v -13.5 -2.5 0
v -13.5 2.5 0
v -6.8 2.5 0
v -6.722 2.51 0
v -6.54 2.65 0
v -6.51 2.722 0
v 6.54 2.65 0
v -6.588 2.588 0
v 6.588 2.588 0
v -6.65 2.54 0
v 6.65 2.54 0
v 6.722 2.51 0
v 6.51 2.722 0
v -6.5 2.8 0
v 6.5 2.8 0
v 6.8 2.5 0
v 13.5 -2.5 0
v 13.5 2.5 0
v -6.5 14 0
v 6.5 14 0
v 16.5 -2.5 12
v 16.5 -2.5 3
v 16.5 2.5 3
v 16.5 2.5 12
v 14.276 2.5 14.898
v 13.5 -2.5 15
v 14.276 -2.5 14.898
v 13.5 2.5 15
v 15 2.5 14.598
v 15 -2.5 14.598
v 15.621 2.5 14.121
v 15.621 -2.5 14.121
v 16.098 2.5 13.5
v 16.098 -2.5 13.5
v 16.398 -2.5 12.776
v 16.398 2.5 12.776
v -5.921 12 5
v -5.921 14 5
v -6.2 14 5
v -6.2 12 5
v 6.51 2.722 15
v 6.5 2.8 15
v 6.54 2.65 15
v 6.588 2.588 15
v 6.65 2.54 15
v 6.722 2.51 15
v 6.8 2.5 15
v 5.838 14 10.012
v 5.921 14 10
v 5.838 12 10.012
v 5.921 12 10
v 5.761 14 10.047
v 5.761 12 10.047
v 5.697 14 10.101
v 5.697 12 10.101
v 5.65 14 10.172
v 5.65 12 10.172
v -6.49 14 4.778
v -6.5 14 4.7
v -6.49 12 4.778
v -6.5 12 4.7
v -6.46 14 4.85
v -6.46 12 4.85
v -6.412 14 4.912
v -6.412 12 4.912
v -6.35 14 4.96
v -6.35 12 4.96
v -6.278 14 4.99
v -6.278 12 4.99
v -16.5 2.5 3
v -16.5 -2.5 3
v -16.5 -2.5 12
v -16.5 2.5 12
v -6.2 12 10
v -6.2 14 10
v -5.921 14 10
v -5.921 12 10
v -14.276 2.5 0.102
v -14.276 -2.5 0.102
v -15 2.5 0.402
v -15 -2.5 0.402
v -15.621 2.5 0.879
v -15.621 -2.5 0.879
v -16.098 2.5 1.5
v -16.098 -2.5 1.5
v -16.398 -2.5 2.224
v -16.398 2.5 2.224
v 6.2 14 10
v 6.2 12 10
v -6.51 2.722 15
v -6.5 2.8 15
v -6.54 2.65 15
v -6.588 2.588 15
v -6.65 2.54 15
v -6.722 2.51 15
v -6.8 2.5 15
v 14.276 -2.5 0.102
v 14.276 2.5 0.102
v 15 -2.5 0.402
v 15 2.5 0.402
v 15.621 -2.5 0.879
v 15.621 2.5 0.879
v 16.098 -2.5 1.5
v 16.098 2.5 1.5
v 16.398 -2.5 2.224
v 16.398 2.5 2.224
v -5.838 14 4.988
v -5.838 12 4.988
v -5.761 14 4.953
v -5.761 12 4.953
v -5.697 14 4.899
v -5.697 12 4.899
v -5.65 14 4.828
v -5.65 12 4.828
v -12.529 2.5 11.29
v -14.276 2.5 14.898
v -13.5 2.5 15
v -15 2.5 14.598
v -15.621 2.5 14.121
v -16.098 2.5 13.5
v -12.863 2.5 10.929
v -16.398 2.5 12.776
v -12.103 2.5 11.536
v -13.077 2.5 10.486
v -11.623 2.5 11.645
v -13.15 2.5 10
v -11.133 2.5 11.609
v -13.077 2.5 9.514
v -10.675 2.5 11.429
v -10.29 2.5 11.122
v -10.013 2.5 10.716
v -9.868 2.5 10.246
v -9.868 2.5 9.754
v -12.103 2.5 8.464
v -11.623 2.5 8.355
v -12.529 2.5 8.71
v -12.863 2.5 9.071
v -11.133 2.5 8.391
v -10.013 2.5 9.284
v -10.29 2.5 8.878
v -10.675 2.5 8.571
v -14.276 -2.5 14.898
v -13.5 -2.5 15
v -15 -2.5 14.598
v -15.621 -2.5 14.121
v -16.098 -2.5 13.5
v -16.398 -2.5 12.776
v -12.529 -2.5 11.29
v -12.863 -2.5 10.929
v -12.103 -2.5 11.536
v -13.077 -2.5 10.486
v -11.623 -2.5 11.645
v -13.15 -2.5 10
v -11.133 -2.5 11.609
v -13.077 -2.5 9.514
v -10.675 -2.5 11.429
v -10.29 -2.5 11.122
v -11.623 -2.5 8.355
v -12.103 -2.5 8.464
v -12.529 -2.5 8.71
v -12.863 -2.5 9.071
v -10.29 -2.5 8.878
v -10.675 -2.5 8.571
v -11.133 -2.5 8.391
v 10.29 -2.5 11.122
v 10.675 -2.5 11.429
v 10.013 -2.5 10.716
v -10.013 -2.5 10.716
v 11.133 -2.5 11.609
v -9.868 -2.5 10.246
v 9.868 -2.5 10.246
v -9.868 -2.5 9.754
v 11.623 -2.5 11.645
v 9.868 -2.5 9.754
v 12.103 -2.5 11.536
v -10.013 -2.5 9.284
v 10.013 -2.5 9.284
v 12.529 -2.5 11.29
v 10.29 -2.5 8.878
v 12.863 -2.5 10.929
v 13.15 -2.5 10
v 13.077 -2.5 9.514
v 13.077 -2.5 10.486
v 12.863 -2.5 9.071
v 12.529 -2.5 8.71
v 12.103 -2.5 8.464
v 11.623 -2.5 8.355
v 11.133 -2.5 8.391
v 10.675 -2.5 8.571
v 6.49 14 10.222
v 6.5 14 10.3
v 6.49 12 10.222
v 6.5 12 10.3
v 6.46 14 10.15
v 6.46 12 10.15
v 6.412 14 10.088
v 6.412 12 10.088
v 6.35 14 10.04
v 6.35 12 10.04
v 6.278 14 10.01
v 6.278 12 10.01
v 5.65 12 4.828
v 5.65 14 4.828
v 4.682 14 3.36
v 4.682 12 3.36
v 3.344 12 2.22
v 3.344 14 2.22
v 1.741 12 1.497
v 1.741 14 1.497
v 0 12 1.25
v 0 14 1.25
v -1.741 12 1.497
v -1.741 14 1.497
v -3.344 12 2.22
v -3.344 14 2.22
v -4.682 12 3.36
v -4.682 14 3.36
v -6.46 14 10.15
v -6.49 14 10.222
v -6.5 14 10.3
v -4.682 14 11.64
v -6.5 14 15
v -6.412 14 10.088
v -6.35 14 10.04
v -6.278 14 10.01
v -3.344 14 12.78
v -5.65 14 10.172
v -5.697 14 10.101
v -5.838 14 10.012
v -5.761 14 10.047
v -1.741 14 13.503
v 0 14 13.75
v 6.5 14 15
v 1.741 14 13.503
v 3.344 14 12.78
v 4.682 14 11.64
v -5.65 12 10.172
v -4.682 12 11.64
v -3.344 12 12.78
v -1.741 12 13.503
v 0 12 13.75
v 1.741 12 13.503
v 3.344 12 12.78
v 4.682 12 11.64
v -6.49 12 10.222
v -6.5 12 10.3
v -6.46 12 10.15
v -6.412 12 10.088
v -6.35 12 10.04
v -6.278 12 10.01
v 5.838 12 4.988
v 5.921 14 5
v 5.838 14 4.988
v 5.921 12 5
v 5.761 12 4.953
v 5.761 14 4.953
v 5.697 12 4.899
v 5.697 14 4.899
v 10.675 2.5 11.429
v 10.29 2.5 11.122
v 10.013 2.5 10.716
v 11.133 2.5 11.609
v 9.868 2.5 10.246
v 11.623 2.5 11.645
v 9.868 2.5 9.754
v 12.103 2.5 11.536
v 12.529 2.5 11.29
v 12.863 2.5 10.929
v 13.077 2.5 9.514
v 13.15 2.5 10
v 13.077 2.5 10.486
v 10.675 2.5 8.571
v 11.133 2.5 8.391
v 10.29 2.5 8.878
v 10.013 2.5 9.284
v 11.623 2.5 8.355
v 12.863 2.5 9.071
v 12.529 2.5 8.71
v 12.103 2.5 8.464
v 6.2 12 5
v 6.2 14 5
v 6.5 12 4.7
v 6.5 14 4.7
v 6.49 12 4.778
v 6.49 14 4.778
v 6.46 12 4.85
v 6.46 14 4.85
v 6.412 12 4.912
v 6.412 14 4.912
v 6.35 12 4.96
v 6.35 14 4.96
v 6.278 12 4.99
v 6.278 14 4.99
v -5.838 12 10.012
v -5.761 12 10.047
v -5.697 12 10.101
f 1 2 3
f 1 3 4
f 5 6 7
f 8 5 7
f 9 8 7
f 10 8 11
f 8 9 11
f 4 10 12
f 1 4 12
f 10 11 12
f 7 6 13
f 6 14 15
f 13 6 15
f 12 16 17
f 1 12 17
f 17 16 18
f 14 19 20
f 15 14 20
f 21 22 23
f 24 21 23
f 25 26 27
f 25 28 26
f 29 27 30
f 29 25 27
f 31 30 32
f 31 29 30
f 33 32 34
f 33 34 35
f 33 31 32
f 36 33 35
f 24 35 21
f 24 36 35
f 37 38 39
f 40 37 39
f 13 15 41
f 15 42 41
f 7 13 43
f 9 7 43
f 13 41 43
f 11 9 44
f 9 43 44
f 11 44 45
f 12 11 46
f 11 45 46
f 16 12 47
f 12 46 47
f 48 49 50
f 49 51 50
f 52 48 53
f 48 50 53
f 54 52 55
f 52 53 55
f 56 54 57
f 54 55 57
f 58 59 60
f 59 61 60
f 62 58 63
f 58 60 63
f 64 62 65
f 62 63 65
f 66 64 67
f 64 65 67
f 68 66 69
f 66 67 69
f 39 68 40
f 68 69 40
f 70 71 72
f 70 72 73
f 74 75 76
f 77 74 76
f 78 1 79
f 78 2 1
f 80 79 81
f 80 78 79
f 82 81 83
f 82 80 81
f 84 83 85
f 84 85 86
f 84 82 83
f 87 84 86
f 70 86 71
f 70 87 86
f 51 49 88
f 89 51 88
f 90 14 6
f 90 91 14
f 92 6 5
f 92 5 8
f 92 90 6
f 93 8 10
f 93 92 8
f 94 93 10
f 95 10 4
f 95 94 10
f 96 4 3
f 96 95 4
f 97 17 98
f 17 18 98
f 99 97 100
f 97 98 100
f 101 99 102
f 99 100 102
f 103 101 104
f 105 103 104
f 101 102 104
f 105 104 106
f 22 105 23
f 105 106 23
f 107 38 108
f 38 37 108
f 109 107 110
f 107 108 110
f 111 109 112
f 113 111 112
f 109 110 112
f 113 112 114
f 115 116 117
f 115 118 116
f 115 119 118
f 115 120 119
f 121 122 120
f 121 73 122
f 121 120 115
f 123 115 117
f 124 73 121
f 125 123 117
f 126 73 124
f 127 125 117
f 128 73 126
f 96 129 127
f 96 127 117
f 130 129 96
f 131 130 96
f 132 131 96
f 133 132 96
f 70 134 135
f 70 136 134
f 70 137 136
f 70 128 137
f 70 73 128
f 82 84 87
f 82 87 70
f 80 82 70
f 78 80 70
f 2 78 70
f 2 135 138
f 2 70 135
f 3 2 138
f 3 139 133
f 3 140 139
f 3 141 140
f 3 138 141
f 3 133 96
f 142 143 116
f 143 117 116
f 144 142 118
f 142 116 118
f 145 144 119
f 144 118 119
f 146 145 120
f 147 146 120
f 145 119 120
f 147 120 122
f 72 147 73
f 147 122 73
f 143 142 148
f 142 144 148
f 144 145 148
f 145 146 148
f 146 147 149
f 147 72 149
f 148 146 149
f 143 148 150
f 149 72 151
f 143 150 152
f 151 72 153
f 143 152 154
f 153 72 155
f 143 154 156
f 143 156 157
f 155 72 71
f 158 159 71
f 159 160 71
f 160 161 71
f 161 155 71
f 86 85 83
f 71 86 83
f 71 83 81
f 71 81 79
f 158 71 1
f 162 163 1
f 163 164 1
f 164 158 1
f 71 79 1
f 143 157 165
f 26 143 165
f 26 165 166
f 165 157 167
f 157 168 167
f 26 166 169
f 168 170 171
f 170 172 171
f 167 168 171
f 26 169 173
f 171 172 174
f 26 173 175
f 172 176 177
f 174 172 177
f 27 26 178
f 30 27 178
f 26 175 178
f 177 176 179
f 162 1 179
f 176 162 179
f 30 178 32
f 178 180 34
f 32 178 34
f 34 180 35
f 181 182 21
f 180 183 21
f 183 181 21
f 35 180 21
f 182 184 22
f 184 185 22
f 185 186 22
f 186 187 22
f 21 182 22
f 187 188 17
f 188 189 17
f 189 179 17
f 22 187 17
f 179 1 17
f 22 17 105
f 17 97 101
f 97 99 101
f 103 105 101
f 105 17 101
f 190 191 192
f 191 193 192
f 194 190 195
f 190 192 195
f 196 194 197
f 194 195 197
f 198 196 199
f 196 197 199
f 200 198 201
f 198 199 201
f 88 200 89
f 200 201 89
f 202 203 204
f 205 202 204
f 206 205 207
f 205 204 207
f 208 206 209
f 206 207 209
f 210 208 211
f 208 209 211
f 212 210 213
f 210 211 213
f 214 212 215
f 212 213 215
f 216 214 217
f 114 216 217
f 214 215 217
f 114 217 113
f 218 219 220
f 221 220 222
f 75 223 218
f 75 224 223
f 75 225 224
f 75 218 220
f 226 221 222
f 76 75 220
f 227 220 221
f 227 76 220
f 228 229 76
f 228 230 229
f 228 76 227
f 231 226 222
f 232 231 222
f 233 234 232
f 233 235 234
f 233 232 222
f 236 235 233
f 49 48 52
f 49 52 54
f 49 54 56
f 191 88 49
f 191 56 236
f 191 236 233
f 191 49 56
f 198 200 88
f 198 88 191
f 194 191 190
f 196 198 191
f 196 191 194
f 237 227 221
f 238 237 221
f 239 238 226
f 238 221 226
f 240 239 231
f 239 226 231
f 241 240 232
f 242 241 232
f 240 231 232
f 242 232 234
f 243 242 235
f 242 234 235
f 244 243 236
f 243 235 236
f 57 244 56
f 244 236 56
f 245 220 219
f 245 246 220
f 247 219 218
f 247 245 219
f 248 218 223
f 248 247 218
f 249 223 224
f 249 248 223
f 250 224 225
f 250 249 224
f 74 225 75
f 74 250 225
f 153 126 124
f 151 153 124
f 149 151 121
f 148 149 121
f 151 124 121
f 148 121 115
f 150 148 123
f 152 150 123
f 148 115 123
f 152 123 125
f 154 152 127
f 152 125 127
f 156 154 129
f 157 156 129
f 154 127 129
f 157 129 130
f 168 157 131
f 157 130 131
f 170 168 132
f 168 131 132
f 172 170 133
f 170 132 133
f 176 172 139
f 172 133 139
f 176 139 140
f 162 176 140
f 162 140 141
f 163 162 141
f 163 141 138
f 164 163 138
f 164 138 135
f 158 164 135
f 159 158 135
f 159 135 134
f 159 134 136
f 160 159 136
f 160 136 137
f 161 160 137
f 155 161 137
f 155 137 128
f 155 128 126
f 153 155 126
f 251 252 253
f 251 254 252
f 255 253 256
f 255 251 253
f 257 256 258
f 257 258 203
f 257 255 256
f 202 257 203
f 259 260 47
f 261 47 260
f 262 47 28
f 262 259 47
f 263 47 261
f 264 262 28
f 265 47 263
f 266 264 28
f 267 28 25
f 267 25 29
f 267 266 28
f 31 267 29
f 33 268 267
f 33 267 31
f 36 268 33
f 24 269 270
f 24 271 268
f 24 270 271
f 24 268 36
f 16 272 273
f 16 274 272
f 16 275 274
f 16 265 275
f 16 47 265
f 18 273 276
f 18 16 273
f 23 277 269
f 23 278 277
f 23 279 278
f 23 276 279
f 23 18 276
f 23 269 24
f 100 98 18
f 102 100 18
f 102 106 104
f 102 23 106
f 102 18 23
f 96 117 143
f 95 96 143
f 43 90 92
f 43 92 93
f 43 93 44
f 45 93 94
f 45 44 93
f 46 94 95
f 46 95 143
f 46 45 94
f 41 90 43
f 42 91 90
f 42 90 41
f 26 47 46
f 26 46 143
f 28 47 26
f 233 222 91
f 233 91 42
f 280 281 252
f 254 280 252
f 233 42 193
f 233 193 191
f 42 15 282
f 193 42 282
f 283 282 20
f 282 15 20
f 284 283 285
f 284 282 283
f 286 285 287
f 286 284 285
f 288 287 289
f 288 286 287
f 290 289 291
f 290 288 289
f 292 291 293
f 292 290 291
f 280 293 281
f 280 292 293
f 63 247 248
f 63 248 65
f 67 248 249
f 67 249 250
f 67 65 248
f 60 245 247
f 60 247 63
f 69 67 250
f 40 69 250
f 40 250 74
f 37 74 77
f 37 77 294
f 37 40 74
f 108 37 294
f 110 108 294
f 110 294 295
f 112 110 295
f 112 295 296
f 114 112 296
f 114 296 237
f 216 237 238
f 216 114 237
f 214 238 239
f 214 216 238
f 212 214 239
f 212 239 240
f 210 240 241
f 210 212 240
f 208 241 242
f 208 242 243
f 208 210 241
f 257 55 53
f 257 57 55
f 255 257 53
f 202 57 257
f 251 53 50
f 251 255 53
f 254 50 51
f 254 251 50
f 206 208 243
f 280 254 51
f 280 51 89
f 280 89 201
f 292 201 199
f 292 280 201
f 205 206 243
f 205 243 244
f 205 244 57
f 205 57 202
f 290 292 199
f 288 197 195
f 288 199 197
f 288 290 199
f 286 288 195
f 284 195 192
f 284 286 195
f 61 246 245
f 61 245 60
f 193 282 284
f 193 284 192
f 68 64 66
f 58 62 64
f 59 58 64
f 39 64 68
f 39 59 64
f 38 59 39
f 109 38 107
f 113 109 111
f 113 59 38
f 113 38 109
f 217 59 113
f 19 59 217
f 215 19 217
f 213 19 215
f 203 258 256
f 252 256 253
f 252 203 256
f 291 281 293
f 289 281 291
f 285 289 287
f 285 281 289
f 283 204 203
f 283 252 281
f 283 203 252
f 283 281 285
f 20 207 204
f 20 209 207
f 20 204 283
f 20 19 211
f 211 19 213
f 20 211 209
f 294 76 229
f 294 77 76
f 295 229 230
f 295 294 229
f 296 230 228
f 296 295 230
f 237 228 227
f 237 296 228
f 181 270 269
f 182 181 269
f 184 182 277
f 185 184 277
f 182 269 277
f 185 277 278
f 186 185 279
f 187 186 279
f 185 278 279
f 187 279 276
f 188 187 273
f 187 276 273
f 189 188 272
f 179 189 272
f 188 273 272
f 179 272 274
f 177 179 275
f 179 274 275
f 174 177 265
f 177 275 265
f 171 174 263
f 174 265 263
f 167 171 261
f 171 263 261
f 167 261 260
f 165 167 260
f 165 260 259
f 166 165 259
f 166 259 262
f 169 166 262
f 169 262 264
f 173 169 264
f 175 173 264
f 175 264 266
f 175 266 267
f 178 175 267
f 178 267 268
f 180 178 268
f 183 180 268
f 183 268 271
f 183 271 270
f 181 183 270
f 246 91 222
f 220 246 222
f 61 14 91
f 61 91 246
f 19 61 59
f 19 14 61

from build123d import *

# Parameters (mm, degrees)
SKETCH_1_W          = 33
SKETCH_1_H          = 5
SKETCH_1_W_2        = 13
SKETCH_1_H_2        = 11.5
EXTRUDE_1_DEPTH     = 15
SKETCH_2_R          = 1.65
CUT_EXTRUDE_1_DEPTH = 26.089838581
CUT_EXTRUDE_3_DEPTH = 2
FILLET_2_R          = 0.3
FILLET_3_R          = 0.3
FILLET_4_R          = 3


with BuildPart() as part:
    # ｽｹｯﾁ1 → ﾎﾞｽ - 押し出し1 (new body)
    with BuildSketch(Plane.XY):
        Rectangle(SKETCH_1_W, SKETCH_1_H)
        with Locations((0, 8.25)):
            Rectangle(SKETCH_1_W_2, SKETCH_1_H_2)
    extrude(amount=EXTRUDE_1_DEPTH)

    # ｽｹｯﾁ2 → ｶｯﾄ - 押し出し1 (cut, through all)
    with BuildSketch(Plane(origin=(0, 2.5, 0), x_dir=(1, 0, 0), z_dir=(0, 1, 0))):
        with Locations(Location((-11.5, -10, 0), (0, 0, 180))):
            Circle(SKETCH_2_R)
        with Locations((11.5, -10)):
            Circle(SKETCH_2_R)
    extrude(amount=-CUT_EXTRUDE_1_DEPTH, mode=Mode.SUBTRACT)

    # ｽｹｯﾁ3 → ｶｯﾄ - 押し出し3 (cut)
    with BuildSketch(Plane(origin=(0, 14, 0), x_dir=(1, 0, 0), z_dir=(0, 1, 0))):
        with BuildLine():
            Line((-5.728219619, -5), (5.728219619, -5))
            ThreePointArc((5.728219619, -5), (0, -1.25), (-5.728219619, -5))
        make_face()
        with BuildLine():
            ThreePointArc((-5.728219619, -10), (0, -13.75), (5.728219619, -10))
            Line((5.728219619, -10), (-5.728219619, -10))
        make_face()
        with BuildLine():
            ThreePointArc((6.25, -7.5), (6.118164456, -6.223064727), (5.728219619, -5))
            Line((5.728219619, -5), (-5.728219619, -5))
            ThreePointArc((-5.728219619, -5), (-6.25, -7.5), (-5.728219619, -10))
            Line((-5.728219619, -10), (5.728219619, -10))
            ThreePointArc((5.728219619, -10), (6.118164456, -8.776935273), (6.25, -7.5))
        make_face()
        with BuildLine():
            ThreePointArc((-5.728219619, -10), (-6.25, -7.5), (-5.728219619, -5))
            Line((-5.728219619, -5), (-6.5, -5))
            Line((-6.5, -5), (-6.5, -10))
            Line((-6.5, -10), (-5.728219619, -10))
        make_face()
        with BuildLine():
            Line((6.5, -10), (6.5, -5))
            Line((6.5, -5), (5.728219619, -5))
            ThreePointArc((5.728219619, -5), (6.118164456, -6.223064727), (6.25, -7.5))
            ThreePointArc((6.25, -7.5), (6.118164456, -8.776935273), (5.728219619, -10))
            Line((5.728219619, -10), (6.5, -10))
        make_face()
    extrude(amount=-CUT_EXTRUDE_3_DEPTH, mode=Mode.SUBTRACT)

    # ﾌｨﾚｯﾄ2
    fillet_2_edges = [part.edges().sort_by_distance(p)[0] for p in [
        (-5.728219619, 13, 5),
        (5.728219619, 13, 5),
        (6.5, 13, 5),
        (6.5, 13, 10),
        (5.728219619, 13, 10),
        (-5.728219619, 13, 10),
        (-6.5, 13, 10),
        (-6.5, 13, 5),
    ]]
    fillet(fillet_2_edges, radius=FILLET_2_R)

    # ﾌｨﾚｯﾄ3
    fillet_3_edges = [part.edges().sort_by_distance(p)[0] for p in [
        (-6.5, 2.5, 7.5),
        (6.5, 2.5, 7.5),
    ]]
    fillet(fillet_3_edges, radius=FILLET_3_R)

    # ﾌｨﾚｯﾄ4
    fillet_4_edges = [part.edges().sort_by_distance(p)[0] for p in [
        (-16.5, 0, 0),
        (-16.5, 0, 15),
        (16.5, 0, 15),
        (16.5, 0, 0),
    ]]
    fillet(fillet_4_edges, radius=FILLET_4_R)


solid = part.part
